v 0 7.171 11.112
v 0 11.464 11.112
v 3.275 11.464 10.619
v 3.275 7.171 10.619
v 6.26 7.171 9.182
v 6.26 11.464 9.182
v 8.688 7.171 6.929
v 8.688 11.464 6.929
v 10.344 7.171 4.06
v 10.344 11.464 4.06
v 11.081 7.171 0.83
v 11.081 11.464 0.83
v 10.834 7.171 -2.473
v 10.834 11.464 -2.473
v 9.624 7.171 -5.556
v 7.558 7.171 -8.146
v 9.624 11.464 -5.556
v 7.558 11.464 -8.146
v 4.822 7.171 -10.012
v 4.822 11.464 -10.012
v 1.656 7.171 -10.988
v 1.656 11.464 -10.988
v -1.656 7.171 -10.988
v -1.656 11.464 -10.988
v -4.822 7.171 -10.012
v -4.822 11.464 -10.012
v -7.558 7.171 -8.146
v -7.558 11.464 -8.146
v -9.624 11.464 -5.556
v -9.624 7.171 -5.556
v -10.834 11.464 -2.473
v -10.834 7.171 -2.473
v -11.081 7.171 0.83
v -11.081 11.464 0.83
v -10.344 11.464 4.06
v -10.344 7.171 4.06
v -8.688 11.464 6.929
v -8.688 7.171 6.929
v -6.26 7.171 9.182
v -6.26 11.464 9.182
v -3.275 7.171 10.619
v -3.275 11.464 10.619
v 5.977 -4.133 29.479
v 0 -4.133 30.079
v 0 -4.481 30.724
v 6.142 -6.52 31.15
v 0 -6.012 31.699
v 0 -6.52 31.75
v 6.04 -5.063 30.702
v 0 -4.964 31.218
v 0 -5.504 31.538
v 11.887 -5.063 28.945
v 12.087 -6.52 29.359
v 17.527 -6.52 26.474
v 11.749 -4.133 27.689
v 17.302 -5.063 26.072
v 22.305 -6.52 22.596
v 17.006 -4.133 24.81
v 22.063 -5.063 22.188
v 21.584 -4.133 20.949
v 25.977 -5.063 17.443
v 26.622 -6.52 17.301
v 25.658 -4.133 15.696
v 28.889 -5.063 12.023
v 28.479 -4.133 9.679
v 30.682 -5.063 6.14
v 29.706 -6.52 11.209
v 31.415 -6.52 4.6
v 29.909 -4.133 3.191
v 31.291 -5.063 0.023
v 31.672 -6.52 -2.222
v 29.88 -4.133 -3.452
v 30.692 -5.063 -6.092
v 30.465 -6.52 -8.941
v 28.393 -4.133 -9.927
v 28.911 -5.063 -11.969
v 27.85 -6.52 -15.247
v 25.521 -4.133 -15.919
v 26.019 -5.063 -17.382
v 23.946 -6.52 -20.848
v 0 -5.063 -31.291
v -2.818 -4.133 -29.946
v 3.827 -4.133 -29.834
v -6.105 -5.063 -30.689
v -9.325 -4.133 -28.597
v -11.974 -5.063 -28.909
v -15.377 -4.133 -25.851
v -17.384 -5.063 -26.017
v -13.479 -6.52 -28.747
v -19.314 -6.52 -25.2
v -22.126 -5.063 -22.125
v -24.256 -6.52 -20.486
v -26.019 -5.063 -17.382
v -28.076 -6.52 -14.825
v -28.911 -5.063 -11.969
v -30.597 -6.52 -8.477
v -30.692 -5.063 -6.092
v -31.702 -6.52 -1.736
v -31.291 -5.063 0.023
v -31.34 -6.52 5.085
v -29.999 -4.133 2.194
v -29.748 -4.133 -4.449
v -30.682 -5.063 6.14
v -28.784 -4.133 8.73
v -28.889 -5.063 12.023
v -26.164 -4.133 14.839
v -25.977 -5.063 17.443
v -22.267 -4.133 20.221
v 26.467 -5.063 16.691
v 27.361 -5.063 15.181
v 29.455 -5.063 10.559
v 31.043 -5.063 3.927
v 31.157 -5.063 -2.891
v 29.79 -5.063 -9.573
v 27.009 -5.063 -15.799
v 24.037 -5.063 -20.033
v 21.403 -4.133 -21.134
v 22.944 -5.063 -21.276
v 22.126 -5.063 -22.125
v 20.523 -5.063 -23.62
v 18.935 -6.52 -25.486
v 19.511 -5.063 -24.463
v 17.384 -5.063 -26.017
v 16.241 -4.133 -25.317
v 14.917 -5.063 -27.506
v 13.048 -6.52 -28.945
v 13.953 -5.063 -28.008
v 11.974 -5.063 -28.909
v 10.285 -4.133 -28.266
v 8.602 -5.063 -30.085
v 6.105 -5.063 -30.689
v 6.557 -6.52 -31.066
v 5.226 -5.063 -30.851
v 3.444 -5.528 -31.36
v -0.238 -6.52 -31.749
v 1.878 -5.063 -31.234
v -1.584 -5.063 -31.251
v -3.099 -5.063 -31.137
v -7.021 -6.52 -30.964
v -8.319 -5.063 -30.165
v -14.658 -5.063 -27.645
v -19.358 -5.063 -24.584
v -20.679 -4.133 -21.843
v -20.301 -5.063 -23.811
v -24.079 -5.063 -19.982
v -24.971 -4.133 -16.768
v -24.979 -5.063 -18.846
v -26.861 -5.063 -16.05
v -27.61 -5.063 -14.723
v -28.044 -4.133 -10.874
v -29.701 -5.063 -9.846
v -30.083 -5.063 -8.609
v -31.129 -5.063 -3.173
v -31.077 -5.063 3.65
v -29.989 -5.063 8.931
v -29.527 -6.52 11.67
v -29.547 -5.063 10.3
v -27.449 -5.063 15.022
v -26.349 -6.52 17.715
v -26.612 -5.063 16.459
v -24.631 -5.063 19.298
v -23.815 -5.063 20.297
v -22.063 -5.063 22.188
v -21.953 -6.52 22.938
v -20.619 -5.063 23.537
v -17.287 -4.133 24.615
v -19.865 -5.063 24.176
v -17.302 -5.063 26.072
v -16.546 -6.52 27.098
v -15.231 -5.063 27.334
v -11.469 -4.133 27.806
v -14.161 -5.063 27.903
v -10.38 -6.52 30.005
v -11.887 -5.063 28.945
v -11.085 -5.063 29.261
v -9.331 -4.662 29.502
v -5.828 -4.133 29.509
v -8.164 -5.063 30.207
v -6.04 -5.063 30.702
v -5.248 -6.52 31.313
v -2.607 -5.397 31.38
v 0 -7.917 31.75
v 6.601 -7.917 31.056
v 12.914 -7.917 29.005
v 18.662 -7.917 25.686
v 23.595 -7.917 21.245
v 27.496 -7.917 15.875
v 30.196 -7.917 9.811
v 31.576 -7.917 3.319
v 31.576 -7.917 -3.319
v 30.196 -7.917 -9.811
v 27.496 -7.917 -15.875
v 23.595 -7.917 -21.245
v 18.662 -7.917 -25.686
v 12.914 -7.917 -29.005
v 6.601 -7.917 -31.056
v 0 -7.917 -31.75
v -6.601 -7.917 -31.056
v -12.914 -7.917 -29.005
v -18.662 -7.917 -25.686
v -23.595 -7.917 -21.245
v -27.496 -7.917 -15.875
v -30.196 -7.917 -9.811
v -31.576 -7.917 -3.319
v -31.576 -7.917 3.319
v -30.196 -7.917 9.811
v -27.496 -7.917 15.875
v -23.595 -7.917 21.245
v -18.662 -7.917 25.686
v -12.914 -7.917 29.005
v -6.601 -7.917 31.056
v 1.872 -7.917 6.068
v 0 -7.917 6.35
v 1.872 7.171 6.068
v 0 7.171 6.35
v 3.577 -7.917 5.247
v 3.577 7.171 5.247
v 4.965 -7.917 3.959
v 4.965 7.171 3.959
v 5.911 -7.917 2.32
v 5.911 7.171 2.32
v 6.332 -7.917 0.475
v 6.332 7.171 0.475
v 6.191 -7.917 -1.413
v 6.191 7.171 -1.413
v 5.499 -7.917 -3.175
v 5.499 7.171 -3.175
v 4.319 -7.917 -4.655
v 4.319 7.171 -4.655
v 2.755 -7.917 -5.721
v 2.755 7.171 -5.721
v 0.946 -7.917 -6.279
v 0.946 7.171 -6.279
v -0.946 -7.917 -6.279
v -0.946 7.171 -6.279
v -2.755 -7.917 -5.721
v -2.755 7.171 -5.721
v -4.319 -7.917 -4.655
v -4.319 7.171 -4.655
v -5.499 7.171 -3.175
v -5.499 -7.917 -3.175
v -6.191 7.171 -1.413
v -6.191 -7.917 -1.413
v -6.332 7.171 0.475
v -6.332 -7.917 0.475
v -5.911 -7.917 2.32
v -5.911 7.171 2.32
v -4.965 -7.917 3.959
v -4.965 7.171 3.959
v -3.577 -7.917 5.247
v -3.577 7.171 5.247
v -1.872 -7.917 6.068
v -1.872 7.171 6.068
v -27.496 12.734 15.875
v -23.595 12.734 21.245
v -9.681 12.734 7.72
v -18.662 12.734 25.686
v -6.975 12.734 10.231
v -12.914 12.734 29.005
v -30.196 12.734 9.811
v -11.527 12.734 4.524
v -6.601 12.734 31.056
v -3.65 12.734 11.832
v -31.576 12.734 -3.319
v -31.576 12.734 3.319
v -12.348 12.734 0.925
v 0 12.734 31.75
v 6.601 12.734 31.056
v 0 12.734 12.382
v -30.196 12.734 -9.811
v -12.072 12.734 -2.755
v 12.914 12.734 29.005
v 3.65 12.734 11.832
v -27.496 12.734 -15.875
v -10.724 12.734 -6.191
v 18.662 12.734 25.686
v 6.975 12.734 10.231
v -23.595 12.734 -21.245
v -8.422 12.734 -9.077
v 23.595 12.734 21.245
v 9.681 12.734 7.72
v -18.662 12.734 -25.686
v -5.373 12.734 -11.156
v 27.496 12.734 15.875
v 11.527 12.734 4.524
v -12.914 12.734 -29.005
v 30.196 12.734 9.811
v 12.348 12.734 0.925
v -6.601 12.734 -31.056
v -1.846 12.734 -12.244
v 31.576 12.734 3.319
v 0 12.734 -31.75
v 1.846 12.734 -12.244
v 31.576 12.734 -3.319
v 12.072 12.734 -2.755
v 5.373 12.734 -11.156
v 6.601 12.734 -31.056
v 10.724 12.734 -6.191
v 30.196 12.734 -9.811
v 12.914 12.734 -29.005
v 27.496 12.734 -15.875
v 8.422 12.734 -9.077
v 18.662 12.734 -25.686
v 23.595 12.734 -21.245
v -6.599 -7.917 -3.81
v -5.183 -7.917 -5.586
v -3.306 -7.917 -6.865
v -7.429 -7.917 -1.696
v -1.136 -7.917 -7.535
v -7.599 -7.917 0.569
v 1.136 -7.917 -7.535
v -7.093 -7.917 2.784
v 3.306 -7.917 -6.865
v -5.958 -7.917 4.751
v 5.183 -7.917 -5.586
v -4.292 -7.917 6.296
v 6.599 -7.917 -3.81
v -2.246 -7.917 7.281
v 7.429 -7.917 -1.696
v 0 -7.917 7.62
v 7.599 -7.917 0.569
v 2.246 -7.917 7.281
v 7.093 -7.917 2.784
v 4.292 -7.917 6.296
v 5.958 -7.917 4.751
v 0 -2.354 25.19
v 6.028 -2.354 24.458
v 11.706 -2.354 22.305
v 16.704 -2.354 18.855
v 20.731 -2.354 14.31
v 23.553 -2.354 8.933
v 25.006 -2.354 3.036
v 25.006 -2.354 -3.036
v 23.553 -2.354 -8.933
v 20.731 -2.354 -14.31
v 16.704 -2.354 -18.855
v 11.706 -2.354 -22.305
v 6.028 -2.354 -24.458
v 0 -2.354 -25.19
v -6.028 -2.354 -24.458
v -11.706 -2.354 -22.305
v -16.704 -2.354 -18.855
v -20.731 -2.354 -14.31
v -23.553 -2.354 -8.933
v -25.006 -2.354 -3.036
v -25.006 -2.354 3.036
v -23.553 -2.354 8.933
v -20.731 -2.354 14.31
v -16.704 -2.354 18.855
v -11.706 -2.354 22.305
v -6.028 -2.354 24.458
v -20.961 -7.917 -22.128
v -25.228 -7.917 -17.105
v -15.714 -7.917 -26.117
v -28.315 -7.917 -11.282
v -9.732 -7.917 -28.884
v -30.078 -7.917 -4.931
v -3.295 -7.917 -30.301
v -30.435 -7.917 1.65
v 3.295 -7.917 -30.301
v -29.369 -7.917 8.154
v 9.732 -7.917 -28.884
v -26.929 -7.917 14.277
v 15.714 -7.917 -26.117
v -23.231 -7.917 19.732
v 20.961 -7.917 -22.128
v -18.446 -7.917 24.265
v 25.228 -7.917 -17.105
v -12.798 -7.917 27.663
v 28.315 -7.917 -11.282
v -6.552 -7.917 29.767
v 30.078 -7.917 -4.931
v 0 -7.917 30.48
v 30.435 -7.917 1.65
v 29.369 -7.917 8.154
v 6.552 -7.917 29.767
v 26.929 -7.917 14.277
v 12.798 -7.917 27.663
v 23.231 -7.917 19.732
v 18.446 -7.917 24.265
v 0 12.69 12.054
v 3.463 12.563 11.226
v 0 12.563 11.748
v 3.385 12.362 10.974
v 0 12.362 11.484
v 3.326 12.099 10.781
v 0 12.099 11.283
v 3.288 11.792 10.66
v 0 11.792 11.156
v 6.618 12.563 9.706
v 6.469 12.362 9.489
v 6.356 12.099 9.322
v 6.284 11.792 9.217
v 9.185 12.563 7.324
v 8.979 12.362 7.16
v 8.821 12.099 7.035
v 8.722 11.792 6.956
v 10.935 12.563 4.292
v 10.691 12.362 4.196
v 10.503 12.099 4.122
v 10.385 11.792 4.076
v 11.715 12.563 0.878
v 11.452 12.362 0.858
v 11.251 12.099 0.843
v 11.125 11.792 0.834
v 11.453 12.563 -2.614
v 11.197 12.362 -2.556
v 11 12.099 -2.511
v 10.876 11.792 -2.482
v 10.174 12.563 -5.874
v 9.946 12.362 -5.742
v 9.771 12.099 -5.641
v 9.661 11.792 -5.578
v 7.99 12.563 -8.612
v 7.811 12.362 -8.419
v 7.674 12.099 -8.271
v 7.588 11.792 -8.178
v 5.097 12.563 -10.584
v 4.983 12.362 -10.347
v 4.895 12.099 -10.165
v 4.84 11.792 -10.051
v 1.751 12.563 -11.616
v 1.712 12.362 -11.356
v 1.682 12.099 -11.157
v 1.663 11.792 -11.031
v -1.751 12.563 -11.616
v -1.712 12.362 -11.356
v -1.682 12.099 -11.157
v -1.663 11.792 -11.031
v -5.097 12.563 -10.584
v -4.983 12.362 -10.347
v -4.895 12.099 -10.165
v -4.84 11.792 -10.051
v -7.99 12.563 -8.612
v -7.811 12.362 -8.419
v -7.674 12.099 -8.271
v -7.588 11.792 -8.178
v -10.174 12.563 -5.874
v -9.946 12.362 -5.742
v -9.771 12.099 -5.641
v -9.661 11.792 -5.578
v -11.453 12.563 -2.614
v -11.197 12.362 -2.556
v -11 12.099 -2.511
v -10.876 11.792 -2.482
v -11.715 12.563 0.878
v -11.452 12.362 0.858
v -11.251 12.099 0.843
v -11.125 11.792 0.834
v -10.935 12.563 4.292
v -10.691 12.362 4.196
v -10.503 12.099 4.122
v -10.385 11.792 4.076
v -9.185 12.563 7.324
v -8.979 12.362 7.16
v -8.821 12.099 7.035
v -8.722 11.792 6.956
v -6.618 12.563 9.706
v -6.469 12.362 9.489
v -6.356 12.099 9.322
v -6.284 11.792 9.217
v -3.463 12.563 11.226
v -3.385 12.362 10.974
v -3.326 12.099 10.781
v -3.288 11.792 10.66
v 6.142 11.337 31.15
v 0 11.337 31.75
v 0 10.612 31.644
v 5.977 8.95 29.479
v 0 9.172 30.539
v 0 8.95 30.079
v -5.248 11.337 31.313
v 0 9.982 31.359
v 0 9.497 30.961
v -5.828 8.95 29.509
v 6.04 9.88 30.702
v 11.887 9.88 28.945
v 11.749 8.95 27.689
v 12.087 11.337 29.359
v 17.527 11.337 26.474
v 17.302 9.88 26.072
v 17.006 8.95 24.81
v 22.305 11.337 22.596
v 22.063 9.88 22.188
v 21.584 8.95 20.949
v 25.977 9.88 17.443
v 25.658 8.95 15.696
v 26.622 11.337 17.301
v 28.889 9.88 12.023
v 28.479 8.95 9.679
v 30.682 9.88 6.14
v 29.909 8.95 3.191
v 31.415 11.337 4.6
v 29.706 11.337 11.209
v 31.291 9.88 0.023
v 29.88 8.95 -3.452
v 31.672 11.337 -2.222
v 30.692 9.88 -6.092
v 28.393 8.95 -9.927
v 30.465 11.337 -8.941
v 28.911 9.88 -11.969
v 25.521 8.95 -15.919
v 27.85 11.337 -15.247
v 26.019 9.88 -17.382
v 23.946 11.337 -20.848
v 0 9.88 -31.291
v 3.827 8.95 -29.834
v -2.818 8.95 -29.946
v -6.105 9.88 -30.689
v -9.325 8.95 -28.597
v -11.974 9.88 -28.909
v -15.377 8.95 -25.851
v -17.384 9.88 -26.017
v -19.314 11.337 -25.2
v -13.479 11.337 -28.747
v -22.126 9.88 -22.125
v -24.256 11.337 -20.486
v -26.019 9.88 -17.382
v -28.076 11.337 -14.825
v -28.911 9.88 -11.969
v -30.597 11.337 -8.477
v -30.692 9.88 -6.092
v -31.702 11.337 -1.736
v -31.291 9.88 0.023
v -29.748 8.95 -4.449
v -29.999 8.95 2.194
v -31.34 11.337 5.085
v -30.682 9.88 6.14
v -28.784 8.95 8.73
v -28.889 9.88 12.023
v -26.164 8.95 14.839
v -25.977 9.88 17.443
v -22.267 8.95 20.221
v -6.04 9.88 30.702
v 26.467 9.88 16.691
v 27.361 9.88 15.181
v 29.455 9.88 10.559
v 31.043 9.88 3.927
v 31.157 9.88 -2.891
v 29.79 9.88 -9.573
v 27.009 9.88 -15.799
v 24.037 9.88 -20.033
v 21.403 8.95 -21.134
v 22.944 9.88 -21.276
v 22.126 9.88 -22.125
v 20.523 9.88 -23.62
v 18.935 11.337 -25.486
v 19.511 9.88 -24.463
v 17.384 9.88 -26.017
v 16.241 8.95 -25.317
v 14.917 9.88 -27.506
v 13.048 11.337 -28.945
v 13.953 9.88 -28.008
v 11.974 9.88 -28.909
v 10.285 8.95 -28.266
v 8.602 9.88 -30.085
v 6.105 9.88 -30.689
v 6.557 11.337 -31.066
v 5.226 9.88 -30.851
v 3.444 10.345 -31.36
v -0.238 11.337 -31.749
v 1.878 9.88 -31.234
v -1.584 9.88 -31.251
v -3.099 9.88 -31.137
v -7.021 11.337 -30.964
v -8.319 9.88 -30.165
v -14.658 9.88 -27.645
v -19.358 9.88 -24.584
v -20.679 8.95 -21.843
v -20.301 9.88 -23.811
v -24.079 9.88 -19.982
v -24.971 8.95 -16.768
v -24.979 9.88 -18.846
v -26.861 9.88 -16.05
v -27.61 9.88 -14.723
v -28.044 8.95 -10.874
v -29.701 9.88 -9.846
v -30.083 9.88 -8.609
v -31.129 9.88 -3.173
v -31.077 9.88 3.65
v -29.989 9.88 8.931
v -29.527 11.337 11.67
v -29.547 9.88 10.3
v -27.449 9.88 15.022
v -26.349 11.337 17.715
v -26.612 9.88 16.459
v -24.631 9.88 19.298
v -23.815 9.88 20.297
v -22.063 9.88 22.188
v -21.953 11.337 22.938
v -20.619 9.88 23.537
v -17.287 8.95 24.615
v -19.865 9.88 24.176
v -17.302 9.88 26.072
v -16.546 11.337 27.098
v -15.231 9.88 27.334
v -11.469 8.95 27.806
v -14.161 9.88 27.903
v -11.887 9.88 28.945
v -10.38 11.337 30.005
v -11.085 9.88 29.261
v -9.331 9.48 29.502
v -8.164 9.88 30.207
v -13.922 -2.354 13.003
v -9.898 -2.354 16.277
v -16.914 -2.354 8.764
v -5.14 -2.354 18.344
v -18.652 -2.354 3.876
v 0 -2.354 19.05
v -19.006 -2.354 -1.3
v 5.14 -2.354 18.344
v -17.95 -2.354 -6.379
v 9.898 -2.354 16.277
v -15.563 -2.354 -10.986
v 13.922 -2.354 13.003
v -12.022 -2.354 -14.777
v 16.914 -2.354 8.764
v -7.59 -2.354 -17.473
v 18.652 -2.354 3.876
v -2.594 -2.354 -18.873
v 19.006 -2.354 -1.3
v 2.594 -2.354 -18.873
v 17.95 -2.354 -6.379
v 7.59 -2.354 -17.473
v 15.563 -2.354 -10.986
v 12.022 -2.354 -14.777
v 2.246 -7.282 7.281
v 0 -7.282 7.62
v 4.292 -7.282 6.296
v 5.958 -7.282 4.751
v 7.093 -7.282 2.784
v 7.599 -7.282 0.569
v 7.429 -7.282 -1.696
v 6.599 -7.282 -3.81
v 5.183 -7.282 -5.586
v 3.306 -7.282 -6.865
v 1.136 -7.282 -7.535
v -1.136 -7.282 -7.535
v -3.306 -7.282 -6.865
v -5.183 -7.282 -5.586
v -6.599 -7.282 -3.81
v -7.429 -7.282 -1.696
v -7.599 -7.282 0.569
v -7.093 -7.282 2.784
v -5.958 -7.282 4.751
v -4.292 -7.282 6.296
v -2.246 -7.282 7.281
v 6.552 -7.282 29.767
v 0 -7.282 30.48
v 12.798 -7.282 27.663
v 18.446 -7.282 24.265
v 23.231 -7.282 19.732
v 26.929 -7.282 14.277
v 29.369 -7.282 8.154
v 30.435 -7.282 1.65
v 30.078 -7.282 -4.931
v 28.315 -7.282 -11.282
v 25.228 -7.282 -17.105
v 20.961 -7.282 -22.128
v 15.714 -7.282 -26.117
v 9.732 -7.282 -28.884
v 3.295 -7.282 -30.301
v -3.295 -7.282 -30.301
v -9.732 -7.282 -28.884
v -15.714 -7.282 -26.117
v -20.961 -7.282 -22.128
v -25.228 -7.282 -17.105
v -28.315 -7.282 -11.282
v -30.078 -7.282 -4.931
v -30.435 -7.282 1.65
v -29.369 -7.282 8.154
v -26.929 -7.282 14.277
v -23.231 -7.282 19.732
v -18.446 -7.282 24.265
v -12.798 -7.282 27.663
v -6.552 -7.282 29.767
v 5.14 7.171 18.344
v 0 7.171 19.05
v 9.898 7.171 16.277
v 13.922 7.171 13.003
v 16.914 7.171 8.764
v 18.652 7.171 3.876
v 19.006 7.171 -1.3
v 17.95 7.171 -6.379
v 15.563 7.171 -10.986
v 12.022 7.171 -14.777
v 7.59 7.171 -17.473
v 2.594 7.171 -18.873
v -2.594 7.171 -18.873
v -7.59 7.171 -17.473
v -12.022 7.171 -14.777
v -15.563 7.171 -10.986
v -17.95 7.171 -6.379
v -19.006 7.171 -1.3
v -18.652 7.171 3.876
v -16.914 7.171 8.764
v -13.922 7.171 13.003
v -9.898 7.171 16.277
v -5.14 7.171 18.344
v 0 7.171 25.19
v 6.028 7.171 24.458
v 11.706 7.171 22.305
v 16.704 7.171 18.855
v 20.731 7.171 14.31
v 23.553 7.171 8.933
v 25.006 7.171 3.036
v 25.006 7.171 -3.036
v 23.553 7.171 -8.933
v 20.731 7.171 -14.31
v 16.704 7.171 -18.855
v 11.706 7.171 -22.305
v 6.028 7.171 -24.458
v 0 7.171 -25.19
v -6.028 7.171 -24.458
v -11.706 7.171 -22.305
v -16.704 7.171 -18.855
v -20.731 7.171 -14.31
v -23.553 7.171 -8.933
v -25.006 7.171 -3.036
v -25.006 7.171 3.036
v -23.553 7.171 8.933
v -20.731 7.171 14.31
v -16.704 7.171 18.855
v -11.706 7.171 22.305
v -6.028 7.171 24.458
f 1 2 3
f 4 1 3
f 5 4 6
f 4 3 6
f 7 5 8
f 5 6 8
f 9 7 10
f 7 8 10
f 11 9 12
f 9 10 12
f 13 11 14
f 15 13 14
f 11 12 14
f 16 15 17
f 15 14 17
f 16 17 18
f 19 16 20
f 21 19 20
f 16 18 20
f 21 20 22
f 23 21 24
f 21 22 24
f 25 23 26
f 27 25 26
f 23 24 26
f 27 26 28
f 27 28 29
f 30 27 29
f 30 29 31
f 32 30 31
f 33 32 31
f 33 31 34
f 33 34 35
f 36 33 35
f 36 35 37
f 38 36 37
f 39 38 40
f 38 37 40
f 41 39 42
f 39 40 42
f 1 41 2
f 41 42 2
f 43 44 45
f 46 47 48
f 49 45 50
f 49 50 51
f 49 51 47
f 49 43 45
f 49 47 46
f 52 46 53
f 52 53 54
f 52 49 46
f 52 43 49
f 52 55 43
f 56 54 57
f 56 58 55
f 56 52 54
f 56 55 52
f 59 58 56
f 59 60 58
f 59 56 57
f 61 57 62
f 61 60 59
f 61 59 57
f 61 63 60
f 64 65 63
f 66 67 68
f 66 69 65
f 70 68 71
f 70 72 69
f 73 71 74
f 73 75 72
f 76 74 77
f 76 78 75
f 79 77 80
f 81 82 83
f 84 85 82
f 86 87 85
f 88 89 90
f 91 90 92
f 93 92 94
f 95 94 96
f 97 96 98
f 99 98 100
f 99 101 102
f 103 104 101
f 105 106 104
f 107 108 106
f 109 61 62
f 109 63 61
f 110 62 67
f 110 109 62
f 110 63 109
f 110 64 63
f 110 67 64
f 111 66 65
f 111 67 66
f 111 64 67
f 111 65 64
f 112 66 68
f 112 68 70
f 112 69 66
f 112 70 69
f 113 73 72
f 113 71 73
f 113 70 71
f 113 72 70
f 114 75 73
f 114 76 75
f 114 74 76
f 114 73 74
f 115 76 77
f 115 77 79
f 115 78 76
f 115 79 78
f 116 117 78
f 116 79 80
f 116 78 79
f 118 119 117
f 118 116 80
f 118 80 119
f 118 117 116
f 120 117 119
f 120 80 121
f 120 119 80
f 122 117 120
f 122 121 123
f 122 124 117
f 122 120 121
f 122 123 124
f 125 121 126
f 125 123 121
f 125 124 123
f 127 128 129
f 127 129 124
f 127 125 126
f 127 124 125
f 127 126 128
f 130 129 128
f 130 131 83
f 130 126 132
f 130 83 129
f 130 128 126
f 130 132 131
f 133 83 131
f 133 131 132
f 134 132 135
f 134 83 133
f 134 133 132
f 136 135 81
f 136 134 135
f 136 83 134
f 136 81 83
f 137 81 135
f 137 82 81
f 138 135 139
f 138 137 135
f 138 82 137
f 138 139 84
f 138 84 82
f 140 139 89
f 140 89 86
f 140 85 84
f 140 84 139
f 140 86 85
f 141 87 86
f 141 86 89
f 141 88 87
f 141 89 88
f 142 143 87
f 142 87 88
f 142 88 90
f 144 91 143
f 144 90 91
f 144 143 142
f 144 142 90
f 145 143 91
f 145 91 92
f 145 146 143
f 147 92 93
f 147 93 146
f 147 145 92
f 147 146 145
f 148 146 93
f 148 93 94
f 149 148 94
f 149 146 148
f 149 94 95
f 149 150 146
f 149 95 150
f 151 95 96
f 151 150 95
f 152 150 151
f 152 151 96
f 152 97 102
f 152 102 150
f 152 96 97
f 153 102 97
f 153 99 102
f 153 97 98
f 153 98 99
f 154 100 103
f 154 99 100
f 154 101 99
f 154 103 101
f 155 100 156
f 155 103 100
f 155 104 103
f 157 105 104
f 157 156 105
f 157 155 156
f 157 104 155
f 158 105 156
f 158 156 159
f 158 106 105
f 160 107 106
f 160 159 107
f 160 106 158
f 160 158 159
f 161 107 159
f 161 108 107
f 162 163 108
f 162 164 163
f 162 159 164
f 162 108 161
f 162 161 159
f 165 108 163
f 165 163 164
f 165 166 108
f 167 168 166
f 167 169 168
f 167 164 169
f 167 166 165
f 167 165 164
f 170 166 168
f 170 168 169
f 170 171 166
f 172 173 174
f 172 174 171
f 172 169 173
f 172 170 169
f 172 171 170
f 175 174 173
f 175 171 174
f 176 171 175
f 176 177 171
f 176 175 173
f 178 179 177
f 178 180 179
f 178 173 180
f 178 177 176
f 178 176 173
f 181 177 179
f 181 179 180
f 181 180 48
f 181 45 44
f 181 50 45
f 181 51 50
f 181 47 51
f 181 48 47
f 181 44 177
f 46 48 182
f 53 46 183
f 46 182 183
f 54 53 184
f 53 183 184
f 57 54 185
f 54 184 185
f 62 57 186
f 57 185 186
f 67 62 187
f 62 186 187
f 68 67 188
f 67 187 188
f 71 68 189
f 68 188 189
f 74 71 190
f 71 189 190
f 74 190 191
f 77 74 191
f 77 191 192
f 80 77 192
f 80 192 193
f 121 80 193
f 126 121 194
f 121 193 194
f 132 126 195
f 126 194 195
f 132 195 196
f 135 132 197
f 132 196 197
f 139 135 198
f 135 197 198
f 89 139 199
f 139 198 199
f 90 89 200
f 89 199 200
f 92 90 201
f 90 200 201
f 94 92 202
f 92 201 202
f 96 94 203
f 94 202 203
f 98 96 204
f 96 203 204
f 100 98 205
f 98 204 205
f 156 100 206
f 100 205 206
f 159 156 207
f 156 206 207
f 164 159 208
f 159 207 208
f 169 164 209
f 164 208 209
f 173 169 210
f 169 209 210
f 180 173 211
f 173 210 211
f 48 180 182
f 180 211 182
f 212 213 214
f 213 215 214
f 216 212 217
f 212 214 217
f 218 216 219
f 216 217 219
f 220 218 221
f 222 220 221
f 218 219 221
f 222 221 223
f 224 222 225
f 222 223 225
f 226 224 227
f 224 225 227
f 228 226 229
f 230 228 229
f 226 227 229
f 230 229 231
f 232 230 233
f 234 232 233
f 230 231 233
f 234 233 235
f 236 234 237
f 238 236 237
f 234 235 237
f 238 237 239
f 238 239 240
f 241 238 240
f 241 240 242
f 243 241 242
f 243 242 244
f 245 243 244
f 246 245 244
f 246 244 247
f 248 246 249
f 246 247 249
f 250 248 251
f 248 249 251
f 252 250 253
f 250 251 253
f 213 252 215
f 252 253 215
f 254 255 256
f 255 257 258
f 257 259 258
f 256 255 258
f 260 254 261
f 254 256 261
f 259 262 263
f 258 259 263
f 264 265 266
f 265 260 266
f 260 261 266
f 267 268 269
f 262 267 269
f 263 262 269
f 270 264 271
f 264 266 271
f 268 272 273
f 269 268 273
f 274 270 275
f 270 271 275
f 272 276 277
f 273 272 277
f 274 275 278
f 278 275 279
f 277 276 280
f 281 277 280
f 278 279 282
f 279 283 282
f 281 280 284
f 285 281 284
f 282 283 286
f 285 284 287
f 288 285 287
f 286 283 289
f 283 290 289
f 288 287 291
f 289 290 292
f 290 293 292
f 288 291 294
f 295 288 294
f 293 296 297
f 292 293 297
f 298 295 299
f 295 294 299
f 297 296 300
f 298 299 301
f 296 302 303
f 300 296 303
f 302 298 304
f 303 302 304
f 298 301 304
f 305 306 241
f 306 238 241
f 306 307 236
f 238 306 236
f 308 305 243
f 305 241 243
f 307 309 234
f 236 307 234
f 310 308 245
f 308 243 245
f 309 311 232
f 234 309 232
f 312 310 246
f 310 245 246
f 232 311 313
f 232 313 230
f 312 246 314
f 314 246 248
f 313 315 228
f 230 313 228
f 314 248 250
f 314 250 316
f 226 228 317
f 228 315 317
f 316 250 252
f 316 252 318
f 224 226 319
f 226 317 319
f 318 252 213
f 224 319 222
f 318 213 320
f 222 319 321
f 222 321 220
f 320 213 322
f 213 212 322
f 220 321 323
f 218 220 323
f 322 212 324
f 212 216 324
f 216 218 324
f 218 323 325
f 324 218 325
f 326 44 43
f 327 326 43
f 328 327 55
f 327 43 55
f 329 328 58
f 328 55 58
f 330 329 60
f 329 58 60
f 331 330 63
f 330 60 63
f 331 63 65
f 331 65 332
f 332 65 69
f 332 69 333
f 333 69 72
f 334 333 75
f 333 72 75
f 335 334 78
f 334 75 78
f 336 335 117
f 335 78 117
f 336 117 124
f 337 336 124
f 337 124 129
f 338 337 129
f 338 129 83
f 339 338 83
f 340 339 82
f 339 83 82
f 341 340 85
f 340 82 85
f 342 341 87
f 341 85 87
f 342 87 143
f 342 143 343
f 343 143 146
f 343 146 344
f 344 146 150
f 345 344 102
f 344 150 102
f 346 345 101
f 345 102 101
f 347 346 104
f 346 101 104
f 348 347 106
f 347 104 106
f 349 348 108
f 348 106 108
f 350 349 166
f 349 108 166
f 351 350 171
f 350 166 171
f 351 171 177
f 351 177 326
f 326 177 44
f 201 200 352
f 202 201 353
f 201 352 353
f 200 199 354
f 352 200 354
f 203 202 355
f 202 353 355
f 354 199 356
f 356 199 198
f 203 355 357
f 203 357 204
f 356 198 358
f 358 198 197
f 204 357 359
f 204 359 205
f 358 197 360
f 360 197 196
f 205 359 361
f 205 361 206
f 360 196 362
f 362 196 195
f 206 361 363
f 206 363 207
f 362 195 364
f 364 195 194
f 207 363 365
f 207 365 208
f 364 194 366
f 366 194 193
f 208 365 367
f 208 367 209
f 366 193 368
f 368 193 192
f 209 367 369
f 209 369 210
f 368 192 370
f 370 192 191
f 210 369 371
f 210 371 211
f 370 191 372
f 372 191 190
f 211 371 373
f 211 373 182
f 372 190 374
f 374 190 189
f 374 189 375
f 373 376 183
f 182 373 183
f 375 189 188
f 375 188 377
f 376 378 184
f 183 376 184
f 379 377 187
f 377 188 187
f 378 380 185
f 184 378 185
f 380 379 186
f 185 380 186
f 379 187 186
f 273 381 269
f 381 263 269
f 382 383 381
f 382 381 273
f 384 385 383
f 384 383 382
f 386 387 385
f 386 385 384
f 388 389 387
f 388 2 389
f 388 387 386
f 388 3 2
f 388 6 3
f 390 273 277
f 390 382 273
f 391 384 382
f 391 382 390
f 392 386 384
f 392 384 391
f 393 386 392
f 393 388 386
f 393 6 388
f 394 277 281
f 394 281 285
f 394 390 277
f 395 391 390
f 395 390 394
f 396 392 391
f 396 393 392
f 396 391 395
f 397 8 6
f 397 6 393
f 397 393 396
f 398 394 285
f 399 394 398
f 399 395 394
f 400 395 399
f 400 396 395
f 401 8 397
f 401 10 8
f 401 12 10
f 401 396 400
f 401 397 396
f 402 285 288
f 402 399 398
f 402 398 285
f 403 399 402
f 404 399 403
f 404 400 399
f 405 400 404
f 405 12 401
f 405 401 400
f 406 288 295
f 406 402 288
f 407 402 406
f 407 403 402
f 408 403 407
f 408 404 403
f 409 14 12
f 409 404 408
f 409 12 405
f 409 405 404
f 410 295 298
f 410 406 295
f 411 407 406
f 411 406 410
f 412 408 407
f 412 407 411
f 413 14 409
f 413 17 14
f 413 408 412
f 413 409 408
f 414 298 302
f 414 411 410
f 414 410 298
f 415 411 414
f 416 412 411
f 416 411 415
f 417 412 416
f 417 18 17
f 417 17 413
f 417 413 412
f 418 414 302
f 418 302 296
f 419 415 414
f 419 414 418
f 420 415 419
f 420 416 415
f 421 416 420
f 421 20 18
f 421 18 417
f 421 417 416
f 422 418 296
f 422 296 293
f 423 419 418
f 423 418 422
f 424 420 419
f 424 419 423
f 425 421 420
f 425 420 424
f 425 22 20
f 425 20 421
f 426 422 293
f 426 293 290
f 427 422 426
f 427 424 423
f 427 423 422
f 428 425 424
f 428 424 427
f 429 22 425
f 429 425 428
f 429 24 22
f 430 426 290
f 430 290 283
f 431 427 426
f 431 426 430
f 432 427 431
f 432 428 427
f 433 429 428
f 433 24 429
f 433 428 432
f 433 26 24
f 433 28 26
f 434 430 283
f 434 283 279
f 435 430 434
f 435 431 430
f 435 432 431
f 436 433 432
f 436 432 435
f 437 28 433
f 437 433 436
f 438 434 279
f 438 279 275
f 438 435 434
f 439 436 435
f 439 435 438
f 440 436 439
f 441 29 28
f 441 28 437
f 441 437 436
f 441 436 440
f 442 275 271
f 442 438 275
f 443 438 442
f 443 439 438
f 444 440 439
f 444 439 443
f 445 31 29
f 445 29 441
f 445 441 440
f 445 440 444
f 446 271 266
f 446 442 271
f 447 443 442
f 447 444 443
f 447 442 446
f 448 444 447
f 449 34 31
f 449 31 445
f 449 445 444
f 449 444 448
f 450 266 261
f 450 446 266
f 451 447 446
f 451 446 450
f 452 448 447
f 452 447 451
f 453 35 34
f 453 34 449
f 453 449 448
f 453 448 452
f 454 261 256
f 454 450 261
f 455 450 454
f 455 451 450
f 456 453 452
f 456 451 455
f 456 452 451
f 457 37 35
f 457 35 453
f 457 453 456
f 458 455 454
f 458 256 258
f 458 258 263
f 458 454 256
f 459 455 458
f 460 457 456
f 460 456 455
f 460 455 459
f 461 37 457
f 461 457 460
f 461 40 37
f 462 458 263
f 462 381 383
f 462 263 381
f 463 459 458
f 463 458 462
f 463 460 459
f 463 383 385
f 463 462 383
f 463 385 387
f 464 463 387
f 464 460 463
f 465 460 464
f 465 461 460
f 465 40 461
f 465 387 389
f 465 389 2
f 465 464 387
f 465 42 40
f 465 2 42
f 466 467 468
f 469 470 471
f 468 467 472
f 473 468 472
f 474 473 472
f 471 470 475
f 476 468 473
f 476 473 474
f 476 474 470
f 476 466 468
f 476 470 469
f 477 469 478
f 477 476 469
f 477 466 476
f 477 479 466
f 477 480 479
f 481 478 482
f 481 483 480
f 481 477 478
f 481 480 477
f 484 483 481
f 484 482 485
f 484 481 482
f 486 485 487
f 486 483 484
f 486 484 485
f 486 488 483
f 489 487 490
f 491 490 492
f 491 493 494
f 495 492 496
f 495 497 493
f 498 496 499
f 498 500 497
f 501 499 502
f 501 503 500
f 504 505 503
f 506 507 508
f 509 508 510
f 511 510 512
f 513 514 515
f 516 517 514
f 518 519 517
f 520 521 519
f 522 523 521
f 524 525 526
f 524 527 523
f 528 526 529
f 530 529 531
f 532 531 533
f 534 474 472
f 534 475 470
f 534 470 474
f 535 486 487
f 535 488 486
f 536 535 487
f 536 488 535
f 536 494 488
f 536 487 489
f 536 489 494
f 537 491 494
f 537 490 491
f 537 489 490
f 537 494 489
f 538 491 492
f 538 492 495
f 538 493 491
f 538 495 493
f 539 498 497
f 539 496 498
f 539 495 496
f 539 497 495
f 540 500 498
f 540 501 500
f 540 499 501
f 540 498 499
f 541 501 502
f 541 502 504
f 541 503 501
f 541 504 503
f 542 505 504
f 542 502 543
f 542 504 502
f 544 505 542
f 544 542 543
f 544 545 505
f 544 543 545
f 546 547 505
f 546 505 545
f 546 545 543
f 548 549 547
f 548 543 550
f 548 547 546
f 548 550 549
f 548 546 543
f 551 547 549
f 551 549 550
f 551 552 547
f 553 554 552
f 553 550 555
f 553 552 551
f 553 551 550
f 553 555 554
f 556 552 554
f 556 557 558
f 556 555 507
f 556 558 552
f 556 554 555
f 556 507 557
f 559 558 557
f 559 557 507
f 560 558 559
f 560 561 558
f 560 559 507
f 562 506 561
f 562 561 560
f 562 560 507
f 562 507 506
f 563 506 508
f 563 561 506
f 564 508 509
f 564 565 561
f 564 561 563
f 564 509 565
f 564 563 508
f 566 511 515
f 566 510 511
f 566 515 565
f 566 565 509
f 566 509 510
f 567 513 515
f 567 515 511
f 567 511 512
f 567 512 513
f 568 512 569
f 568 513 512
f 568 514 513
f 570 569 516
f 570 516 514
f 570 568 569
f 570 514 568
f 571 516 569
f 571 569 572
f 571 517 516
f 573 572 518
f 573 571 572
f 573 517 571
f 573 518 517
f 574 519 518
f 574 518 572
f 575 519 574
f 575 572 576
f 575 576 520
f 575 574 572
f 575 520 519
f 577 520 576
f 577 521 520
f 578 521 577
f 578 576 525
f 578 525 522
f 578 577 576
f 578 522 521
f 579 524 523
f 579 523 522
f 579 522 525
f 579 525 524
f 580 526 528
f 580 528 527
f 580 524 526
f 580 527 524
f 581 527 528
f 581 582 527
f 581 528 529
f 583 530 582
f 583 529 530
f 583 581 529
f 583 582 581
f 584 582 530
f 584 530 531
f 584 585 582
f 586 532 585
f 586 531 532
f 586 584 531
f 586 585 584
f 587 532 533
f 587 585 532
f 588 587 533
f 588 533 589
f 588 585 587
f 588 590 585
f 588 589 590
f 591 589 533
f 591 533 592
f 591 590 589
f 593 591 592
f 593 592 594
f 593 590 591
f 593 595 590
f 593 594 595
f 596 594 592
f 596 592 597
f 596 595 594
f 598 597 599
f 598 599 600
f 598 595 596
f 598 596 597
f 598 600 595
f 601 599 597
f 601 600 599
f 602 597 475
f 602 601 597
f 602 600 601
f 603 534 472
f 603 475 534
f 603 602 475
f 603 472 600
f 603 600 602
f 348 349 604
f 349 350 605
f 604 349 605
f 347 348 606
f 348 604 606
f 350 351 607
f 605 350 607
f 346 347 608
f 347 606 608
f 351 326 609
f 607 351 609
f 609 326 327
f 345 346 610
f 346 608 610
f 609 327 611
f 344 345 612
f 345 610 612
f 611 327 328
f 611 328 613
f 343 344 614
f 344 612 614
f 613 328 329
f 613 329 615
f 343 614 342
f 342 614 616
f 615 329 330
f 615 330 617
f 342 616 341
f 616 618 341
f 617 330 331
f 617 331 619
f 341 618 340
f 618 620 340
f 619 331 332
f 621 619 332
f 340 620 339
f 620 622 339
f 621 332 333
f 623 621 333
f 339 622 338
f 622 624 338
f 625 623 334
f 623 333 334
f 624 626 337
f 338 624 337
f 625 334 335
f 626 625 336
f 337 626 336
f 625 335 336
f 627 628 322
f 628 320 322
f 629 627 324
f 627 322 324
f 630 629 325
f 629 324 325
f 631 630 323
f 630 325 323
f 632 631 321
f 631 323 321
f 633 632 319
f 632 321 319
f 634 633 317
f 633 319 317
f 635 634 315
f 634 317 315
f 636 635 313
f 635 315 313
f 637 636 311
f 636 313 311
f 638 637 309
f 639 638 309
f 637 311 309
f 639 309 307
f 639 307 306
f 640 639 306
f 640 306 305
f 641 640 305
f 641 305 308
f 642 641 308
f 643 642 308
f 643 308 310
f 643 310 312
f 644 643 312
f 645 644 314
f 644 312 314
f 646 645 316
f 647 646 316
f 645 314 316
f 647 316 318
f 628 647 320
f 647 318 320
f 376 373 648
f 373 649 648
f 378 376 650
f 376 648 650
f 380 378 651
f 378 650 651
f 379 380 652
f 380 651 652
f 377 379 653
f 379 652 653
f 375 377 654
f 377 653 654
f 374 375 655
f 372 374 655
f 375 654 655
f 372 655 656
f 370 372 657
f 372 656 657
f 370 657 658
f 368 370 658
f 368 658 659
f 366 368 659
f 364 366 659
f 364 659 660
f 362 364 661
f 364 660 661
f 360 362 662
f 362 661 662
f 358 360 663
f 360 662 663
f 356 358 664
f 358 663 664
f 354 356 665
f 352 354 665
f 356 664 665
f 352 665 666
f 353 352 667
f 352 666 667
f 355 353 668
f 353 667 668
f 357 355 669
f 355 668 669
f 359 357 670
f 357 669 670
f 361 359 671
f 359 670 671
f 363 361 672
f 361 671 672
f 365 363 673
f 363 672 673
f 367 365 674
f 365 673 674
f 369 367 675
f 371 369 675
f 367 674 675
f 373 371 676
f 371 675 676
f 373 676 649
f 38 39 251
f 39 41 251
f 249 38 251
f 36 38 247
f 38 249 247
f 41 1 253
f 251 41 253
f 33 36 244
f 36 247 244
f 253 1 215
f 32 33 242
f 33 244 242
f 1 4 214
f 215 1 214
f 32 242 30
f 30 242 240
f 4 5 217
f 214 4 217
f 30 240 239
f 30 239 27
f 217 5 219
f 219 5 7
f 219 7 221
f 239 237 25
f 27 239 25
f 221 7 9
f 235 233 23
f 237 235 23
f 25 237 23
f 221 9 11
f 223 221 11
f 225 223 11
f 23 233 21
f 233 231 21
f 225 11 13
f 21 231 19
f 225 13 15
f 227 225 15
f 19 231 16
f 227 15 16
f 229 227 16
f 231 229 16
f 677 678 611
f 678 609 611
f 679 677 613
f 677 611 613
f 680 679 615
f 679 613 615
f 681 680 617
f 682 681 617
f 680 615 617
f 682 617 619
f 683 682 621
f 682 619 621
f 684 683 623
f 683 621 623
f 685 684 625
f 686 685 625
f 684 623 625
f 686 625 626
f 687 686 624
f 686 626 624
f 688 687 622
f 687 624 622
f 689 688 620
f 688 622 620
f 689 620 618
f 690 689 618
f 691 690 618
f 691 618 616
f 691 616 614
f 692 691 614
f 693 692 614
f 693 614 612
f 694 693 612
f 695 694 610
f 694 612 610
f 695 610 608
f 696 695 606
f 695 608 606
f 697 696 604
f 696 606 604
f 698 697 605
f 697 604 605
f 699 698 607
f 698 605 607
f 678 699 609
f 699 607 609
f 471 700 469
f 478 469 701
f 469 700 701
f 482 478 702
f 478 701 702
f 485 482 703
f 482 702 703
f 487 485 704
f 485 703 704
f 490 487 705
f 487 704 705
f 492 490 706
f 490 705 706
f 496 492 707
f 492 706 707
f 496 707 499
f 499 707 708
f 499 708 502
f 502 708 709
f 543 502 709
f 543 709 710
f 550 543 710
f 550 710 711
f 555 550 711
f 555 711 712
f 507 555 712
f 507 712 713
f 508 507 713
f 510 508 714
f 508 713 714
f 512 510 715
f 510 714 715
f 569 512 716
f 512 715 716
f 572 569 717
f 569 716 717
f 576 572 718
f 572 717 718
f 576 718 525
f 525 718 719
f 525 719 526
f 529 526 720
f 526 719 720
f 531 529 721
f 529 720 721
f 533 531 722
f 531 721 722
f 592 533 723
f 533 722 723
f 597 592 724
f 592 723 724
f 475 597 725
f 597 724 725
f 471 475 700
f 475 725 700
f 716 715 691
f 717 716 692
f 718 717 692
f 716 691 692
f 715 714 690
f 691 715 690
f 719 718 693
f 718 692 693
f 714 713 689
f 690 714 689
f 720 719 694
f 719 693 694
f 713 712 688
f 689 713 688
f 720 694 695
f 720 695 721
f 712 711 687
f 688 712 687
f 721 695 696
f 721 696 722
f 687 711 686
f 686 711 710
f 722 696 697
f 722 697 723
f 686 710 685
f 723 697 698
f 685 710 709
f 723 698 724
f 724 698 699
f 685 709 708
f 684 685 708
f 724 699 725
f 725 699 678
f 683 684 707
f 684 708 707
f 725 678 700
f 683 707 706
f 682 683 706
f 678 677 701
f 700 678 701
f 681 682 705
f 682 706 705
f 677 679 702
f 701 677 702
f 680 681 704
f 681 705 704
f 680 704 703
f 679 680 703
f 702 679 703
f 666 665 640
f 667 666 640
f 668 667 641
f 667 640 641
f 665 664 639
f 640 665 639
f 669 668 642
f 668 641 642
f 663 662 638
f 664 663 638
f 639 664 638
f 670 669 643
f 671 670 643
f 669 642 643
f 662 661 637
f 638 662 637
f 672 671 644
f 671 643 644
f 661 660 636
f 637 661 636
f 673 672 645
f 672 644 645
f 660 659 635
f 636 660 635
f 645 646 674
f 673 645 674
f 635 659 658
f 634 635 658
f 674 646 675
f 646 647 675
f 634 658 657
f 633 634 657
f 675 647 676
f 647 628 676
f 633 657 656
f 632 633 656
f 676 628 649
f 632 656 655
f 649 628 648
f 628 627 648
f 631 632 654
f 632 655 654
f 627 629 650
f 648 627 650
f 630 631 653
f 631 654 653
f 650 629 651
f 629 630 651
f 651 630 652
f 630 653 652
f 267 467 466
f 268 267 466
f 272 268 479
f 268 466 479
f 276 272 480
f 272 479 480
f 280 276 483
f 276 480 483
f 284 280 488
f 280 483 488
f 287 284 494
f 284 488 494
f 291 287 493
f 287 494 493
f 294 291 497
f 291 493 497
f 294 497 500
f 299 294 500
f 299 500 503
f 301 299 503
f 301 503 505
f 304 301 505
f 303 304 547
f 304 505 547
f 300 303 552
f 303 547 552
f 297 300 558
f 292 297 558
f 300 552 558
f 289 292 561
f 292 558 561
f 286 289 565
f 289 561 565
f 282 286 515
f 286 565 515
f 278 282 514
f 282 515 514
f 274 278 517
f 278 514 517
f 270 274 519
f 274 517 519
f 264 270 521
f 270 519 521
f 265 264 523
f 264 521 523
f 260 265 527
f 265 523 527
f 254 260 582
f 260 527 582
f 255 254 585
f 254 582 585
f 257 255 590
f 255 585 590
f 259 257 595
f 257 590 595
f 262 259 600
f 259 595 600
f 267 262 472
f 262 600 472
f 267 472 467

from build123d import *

# Parameters (mm, degrees)
F2_R = 2.54
F3_R = 1.27


with BuildPart() as f1:
    # F0 (on Right) → F1 (revolve)
    with BuildSketch(Plane.YZ):
        Polygon((-7.916564, 6.35), (7.171036, 6.35), (7.171036, 11.1125), (12.733636, 11.1125), (12.733636, 31.75), (9.558636, 31.75), (7.171036, 25.190123), (7.171036, 19.05), (-2.353964, 19.05), (-2.353964, 25.190123), (-4.741564, 31.75), (-7.916564, 31.75), (-7.916564, 30.48), (-7.281564, 30.48), (-7.281564, 7.62), (-7.916564, 7.62), align=None)
    revolve(axis=Axis((0, 2.81315, 0), (0, 1, 0)))

    # F2
    f2_edges = [f1.edges().sort_by_distance(p)[0] for p in [
        (0, 9.558636, -31.75),
        (0, -4.741564, -31.75),
    ]]
    fillet(f2_edges, radius=F2_R)

    # F3
    f3_edges = [f1.edges().sort_by_distance(p)[0] for p in [
        (0, 12.733636, -11.1125),
    ]]
    fillet(f3_edges, radius=F3_R)


solid = f1.part
